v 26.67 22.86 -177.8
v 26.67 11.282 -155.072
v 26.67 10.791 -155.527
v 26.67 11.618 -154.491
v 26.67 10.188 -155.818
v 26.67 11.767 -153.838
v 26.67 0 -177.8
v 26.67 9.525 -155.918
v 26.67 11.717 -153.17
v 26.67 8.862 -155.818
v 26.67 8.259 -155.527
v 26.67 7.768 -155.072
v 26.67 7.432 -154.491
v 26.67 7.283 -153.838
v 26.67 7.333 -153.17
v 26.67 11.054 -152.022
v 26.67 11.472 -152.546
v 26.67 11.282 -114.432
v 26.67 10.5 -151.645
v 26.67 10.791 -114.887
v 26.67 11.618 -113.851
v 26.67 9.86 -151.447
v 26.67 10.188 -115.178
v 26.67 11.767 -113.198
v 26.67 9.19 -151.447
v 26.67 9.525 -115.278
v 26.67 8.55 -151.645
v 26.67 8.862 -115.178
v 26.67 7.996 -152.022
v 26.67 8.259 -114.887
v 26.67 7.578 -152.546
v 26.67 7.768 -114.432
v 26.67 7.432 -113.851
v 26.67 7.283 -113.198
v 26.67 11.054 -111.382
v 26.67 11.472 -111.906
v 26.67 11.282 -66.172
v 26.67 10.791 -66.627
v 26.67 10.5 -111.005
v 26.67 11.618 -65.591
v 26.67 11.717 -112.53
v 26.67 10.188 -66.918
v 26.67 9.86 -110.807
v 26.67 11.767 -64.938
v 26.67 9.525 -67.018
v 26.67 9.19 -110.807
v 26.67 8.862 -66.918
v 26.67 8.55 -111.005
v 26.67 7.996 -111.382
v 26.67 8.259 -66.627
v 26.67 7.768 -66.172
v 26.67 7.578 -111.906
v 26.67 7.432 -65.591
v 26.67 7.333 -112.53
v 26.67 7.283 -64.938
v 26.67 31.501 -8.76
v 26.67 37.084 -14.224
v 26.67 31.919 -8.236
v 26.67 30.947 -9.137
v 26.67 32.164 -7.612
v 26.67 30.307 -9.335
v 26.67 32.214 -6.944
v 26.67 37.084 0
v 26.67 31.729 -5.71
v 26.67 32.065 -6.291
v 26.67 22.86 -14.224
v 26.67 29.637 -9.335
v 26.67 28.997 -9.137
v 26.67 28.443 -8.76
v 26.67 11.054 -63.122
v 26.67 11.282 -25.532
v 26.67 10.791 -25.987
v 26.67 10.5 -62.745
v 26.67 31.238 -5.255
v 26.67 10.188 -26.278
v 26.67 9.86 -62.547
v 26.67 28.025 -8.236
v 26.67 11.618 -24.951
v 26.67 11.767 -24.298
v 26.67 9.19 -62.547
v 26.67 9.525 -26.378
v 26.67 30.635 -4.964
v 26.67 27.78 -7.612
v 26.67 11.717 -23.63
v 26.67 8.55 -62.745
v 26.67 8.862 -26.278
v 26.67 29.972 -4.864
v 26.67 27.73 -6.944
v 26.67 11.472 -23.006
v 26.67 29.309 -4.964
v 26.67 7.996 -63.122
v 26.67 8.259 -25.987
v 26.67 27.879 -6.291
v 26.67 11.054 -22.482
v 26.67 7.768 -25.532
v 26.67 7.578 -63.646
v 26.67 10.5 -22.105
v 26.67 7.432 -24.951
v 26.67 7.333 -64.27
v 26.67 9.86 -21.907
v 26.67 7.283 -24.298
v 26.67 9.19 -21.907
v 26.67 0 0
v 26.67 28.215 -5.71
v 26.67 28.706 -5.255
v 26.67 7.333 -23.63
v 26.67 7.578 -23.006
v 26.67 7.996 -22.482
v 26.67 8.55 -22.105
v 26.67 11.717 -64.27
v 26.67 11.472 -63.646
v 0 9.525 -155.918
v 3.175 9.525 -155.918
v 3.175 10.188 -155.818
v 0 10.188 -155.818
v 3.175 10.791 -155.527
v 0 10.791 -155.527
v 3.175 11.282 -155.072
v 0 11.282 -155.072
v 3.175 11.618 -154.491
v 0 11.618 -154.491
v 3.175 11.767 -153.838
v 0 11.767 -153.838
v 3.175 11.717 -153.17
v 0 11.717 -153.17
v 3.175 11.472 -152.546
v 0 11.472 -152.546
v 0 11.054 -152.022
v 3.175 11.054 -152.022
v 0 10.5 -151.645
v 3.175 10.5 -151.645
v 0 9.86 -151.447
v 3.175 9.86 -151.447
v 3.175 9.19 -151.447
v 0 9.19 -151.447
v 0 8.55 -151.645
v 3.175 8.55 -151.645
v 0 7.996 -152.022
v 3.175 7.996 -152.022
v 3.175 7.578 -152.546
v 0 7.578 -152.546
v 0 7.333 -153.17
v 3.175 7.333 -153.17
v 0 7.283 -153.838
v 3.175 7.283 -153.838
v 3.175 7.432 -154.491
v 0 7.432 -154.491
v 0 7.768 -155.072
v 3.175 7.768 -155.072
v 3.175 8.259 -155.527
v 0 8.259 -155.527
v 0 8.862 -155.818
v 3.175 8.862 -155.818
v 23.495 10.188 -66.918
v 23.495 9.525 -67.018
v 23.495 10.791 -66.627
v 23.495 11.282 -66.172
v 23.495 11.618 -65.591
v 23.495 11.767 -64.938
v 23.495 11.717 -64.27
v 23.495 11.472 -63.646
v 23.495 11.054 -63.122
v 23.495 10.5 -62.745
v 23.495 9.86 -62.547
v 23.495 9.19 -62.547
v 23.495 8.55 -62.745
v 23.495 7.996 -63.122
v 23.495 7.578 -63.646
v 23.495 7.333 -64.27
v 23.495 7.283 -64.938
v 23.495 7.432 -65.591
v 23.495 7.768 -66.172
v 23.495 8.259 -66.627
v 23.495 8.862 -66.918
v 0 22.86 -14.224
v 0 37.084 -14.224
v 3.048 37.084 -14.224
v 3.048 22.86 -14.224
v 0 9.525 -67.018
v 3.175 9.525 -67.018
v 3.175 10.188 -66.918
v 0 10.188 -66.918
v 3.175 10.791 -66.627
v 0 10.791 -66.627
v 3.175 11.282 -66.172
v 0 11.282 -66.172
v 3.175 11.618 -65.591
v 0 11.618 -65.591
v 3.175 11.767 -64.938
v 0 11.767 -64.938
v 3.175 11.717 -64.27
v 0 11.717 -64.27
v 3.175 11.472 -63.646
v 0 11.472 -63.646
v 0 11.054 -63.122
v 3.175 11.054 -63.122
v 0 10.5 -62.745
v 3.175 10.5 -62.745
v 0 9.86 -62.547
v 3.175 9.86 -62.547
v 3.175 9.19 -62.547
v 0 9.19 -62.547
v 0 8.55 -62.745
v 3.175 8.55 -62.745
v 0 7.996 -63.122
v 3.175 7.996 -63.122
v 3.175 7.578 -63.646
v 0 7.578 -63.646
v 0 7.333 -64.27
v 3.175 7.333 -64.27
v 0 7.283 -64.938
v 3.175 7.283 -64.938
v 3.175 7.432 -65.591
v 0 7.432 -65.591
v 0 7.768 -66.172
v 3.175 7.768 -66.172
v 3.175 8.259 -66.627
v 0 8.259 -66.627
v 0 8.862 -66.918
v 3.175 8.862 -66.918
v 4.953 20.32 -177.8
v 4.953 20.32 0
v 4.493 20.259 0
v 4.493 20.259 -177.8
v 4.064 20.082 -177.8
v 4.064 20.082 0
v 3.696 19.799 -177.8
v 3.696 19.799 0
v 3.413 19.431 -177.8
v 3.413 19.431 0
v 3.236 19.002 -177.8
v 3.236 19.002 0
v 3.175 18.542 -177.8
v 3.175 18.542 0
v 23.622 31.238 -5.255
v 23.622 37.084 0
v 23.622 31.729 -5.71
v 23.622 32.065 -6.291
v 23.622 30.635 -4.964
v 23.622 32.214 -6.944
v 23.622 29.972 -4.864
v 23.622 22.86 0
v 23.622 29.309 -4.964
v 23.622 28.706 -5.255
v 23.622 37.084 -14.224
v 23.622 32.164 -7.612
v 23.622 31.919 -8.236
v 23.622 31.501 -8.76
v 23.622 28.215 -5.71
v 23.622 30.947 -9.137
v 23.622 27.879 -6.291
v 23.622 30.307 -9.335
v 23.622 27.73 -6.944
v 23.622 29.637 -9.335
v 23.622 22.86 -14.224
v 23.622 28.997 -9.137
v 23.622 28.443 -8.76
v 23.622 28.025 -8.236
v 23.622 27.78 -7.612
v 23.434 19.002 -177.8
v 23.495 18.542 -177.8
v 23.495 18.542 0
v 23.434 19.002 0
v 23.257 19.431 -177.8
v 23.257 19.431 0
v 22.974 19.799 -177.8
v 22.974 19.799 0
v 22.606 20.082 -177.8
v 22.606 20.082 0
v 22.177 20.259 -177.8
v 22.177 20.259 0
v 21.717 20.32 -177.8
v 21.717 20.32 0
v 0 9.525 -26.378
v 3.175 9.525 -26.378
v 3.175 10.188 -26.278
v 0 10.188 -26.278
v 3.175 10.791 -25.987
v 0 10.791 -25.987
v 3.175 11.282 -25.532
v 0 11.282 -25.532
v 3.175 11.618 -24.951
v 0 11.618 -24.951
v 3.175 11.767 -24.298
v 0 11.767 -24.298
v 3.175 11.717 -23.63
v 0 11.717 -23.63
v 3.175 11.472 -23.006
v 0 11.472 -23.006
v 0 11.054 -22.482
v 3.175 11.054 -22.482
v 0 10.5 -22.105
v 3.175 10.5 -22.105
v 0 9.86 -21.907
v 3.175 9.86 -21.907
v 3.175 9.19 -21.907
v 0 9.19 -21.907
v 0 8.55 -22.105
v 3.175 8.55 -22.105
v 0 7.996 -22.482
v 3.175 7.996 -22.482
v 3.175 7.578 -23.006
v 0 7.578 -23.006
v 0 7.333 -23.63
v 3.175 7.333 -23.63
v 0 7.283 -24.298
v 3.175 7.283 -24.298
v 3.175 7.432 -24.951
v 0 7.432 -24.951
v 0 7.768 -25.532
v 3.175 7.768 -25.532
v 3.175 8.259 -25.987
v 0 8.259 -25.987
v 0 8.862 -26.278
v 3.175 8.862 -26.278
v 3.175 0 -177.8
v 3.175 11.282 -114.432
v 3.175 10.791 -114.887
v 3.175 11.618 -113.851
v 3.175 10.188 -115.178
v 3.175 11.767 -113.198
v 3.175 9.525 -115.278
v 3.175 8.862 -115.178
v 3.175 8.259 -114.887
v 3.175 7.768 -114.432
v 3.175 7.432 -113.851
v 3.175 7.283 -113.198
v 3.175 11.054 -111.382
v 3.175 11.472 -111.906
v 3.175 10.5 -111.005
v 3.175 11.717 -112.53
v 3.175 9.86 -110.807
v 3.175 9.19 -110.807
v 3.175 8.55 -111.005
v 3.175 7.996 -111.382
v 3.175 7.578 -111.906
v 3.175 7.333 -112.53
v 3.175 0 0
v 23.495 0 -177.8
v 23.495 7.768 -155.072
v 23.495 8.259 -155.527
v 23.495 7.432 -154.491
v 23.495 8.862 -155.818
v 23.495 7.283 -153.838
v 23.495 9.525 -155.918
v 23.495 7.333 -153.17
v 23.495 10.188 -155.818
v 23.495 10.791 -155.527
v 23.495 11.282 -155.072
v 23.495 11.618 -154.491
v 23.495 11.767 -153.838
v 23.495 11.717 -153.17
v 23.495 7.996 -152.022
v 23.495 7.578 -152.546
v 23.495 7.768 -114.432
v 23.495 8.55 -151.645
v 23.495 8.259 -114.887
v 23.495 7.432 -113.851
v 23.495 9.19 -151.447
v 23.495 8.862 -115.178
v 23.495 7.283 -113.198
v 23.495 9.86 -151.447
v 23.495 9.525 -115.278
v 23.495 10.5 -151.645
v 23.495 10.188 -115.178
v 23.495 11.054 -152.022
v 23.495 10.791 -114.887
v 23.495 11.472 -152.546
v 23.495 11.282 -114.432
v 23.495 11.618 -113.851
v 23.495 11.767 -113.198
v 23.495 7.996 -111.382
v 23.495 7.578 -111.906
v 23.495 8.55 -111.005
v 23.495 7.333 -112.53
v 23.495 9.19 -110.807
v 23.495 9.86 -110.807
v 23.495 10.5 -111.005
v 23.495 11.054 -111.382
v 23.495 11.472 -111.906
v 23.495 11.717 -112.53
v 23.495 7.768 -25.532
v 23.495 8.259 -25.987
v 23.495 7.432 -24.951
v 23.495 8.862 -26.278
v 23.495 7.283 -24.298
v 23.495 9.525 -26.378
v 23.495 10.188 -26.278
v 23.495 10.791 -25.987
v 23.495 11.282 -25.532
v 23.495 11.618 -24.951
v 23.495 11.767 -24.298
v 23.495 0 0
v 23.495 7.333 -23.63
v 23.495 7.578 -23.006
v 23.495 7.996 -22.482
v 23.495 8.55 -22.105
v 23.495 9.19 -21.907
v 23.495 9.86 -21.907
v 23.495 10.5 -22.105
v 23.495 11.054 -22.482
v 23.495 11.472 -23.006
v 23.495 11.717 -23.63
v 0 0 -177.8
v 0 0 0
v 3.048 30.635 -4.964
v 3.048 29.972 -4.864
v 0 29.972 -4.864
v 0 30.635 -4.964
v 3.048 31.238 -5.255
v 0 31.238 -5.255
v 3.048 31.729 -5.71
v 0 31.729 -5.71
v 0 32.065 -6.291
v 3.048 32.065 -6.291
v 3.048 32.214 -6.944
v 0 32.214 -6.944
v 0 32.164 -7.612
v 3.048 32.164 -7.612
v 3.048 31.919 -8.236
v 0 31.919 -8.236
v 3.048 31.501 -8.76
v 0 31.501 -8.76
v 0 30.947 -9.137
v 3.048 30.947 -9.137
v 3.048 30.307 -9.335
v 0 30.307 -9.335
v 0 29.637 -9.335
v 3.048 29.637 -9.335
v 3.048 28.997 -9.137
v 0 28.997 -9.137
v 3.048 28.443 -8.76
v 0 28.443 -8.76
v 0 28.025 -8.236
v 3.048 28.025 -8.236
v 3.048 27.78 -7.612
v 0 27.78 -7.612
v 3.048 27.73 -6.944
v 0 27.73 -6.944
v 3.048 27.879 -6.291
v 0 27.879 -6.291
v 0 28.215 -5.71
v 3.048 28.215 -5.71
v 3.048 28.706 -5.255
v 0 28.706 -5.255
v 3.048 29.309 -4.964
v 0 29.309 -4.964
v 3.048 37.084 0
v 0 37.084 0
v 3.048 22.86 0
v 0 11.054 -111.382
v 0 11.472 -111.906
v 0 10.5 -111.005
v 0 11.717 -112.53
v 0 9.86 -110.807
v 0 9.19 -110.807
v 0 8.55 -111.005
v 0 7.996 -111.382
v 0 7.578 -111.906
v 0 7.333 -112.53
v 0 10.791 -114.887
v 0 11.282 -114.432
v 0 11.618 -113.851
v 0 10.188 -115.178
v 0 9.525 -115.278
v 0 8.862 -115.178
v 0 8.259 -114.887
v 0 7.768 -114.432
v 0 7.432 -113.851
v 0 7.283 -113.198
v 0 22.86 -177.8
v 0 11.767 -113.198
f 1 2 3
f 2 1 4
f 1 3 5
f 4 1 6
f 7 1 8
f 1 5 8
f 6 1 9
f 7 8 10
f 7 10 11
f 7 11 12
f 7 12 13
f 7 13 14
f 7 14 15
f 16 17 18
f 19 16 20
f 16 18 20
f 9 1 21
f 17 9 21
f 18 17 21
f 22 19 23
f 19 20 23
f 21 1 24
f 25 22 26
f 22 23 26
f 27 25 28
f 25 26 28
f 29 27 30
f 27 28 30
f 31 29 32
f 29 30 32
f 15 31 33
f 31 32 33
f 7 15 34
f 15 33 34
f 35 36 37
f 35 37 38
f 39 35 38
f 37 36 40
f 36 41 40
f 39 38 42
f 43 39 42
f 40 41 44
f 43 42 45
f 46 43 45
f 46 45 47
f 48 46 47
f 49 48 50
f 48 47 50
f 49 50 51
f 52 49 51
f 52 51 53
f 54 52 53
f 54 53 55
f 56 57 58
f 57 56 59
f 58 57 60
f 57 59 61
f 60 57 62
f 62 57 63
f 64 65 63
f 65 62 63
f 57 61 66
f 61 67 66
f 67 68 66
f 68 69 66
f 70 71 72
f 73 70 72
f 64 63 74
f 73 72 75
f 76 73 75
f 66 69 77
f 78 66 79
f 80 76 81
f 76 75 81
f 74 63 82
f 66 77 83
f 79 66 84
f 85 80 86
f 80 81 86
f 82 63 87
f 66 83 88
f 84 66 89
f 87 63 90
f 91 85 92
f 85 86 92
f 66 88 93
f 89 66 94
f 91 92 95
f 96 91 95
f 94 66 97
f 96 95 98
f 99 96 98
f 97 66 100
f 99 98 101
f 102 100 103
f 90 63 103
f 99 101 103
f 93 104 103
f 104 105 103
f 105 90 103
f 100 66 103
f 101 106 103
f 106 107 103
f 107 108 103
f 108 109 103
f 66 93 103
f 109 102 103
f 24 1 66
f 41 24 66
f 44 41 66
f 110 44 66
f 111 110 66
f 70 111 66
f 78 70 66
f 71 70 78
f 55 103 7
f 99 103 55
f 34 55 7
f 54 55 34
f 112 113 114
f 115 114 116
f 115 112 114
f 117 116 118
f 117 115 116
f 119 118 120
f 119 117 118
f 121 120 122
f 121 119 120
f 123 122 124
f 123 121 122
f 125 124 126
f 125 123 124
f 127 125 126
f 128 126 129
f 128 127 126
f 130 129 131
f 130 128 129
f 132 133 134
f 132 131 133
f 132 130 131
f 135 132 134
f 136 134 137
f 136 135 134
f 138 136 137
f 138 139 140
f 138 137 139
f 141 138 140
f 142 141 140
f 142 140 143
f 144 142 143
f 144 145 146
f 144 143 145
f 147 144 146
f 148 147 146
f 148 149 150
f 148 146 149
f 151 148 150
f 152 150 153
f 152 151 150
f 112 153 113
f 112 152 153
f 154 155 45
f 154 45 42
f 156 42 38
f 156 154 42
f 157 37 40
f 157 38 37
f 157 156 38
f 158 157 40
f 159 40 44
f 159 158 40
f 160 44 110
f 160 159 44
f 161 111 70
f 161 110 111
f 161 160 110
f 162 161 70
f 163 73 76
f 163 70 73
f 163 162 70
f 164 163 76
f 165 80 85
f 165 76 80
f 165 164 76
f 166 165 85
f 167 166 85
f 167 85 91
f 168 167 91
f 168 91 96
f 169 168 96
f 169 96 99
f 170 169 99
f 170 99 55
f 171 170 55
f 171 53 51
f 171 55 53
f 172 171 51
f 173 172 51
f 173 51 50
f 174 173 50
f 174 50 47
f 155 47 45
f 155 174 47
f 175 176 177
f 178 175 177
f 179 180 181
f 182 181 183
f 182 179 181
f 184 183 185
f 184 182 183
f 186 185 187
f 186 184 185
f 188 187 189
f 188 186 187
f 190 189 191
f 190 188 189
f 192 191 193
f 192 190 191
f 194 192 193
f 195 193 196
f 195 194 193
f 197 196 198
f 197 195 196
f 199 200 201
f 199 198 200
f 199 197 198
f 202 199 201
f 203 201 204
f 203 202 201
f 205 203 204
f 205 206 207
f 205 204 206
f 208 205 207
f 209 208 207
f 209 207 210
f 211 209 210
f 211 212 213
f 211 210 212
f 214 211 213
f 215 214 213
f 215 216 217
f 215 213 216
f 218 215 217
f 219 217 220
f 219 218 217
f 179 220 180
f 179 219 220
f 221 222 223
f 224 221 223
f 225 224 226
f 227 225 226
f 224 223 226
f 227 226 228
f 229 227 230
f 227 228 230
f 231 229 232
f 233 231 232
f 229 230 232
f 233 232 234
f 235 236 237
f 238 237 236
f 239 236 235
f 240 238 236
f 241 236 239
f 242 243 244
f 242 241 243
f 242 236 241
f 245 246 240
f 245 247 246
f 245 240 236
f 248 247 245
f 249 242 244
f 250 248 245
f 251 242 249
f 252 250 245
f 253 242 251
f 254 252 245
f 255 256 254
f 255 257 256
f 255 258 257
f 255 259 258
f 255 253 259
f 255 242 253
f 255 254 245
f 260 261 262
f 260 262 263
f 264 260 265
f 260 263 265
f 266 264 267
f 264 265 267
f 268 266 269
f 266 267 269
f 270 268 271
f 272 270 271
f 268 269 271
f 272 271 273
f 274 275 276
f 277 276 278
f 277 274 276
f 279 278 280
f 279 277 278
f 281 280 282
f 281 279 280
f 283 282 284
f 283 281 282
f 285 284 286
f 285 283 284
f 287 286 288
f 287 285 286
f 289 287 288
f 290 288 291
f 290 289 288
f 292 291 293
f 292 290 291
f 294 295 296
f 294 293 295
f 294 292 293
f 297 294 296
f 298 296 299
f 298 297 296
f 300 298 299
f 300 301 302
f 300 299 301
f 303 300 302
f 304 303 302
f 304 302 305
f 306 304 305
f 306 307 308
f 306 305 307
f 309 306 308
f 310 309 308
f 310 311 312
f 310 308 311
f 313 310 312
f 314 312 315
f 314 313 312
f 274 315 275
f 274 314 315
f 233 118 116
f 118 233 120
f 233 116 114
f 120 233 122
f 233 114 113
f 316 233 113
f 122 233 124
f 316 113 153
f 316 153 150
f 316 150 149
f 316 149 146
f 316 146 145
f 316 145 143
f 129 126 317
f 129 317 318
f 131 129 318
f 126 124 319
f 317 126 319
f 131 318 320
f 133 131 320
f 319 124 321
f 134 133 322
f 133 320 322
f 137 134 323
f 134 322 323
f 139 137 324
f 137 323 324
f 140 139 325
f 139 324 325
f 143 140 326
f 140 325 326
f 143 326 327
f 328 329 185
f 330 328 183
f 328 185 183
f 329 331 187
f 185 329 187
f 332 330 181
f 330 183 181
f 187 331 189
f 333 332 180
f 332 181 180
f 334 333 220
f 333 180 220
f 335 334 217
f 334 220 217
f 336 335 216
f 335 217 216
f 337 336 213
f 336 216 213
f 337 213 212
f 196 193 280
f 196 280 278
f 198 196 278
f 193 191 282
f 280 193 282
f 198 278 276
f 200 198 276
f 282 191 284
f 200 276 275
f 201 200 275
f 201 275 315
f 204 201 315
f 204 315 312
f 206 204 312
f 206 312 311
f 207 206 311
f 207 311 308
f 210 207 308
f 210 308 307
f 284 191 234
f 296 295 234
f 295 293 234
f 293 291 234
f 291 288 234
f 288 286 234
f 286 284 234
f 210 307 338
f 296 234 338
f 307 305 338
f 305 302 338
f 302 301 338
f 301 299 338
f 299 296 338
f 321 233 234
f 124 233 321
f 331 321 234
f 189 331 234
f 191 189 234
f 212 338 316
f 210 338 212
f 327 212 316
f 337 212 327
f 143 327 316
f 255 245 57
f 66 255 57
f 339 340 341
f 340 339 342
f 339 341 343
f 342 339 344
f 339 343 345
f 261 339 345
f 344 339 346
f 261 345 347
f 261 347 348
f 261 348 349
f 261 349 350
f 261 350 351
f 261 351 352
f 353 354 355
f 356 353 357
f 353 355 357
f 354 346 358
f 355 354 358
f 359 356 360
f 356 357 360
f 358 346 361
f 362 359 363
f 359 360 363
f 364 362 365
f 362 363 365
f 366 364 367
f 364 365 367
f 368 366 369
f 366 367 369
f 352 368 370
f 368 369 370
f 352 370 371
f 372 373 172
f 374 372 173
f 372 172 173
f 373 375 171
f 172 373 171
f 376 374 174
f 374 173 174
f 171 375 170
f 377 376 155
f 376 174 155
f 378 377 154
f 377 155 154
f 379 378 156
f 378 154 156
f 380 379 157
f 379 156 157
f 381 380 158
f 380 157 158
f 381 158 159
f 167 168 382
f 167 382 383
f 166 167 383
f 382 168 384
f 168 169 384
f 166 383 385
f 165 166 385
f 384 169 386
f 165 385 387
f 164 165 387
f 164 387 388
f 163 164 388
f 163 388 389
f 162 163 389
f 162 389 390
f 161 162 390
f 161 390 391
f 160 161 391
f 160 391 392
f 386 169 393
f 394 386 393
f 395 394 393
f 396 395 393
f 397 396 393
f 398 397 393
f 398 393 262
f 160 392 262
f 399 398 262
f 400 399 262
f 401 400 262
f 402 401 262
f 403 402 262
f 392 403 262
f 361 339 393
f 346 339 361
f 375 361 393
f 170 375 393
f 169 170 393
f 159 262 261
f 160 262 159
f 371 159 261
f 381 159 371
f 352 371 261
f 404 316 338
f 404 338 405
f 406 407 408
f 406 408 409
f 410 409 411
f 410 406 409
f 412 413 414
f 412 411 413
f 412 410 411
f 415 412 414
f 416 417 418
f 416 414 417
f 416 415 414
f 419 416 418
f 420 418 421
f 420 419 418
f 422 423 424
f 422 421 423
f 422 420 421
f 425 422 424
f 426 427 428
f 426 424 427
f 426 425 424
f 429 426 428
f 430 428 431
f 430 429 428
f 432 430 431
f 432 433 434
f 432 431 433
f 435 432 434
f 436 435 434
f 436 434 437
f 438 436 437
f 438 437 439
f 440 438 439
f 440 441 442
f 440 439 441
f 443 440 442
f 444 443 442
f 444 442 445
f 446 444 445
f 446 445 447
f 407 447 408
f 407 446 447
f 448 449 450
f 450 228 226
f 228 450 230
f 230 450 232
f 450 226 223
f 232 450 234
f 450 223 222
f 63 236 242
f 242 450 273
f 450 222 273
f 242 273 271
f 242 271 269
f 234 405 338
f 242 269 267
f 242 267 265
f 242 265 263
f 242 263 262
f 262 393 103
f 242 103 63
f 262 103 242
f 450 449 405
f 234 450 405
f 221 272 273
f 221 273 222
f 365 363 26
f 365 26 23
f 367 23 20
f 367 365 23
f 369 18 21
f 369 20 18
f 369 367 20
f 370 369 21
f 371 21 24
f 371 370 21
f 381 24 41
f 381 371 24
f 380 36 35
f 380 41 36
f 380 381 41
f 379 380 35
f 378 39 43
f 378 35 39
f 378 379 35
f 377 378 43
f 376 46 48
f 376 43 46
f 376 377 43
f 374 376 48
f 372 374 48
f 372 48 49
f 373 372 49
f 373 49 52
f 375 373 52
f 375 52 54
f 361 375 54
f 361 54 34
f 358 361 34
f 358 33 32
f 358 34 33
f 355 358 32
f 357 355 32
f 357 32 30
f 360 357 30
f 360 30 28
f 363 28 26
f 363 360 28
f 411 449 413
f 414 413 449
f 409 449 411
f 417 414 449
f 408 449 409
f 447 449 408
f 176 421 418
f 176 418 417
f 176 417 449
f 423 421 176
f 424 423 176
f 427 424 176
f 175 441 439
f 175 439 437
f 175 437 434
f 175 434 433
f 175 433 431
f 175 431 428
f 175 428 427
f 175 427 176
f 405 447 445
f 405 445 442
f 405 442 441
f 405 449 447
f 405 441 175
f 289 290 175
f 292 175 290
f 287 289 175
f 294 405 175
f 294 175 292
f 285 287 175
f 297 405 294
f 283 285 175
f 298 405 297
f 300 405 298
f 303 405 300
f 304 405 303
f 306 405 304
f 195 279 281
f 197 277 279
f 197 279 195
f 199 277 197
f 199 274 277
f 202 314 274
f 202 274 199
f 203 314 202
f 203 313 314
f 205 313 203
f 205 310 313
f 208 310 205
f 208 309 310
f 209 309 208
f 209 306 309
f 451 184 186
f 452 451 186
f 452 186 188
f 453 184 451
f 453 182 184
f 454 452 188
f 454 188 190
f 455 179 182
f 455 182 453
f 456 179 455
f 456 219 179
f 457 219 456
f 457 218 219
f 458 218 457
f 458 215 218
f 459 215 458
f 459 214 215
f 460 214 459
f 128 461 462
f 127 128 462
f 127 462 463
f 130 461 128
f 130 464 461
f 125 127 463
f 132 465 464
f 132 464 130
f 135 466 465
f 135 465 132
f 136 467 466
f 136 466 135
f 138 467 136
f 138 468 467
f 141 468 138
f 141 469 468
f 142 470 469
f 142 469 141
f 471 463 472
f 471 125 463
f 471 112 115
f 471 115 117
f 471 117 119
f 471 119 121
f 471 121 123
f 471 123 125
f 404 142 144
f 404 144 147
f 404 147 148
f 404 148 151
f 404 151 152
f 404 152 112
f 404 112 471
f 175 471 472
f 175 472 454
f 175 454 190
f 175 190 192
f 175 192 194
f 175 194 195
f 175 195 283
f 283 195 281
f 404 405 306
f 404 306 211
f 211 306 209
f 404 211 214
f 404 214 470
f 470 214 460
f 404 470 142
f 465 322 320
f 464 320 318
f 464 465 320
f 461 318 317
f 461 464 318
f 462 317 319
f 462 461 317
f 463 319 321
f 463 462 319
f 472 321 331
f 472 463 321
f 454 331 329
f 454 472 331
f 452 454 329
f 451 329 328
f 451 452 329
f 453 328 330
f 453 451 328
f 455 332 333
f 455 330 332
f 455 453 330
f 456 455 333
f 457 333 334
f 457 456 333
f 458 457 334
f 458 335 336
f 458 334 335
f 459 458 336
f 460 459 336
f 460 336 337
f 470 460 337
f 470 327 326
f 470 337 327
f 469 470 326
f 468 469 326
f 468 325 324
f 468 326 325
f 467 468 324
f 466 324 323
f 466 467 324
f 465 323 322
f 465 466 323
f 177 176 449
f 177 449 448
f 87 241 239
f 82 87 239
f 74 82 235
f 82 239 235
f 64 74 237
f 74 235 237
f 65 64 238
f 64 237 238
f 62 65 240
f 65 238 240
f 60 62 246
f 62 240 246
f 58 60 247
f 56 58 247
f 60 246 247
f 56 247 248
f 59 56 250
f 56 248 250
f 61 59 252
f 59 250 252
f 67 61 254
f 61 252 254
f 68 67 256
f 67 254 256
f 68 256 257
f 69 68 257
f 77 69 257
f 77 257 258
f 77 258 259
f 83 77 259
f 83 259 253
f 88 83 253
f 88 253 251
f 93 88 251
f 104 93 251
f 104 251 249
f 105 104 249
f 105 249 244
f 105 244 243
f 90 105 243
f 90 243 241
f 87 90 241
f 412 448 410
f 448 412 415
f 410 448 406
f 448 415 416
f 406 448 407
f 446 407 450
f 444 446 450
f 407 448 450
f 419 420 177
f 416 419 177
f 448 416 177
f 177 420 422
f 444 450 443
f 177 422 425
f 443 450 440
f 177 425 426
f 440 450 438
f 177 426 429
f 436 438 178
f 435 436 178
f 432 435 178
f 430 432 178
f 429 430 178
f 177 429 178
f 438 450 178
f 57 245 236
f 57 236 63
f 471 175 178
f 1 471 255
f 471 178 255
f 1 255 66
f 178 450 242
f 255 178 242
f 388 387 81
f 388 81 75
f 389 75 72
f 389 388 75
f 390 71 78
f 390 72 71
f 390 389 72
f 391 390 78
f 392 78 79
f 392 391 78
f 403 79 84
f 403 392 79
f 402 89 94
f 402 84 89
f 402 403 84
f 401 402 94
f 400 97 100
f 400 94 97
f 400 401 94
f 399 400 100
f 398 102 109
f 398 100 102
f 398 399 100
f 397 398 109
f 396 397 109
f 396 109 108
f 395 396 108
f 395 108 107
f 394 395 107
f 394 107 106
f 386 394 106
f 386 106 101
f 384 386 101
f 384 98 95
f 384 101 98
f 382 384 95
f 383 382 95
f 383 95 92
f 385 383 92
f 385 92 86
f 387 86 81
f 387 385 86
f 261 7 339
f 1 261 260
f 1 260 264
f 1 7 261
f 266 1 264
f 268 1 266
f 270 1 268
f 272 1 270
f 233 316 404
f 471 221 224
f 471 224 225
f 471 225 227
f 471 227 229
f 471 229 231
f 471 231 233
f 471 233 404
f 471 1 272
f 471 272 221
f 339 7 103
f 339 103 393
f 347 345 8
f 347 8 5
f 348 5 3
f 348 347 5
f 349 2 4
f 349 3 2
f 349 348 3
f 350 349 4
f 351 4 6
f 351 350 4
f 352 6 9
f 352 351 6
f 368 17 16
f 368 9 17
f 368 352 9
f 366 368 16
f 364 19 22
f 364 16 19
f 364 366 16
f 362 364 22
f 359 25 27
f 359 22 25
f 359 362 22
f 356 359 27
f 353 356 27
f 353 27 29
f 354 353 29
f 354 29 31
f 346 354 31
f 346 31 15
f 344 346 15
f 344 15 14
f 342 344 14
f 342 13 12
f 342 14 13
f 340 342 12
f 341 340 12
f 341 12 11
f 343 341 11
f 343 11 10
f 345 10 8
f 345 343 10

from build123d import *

# Parameters (mm, degrees)
BOSS_EXTRUDE2_DEPTH     = 177.8
SKETCH19_R              = 2.2479
CUT_EXTRUDE3_DEPTH      = 27.67
SKETCH21_W              = 3.048
SKETCH21_H              = 14.224
BOSS_EXTRUDE4_DEPTH     = 14.224
SKETCH22_R              = 2.2479
CUT_EXTRUDE4_DEPTH      = 24.622
CUT_EXTRUDE4_DEPTH_BACK = 4.048


with BuildPart() as part:
    # Sketch2 → Boss-Extrude2 (new body)
    with BuildSketch(Plane.XY):
        with BuildLine():
            Line((0, 0), (0, 22.86))
            Line((0, 22.86), (26.67, 22.86))
            Line((26.67, 22.86), (26.67, 0))
            Line((26.67, 0), (23.495, 0))
            Line((23.495, 0), (23.495, 18.542))
            ThreePointArc((23.495, 18.542), (22.974235857, 19.799235857), (21.717, 20.32))
            Line((21.717, 20.32), (4.953, 20.32))
            ThreePointArc((4.953, 20.32), (3.695764143, 19.799235857), (3.175, 18.542))
            Line((3.175, 18.542), (3.175, 0))
            Line((3.175, 0), (0, 0))
        make_face()
    extrude(amount=-BOSS_EXTRUDE2_DEPTH)

    # Sketch19 → Cut-Extrude3 (cut, through all)
    with BuildSketch(Plane(origin=(0, 0, 0), x_dir=(0, 0, -1), z_dir=(1, 0, 0))):
        with Locations((24.13, 9.525)):
            Circle(SKETCH19_R)
        with Locations((64.77, 9.525)):
            Circle(SKETCH19_R)
        with Locations((113.03, 9.525)):
            Circle(SKETCH19_R)
        with Locations((153.67, 9.525)):
            Circle(SKETCH19_R)
    extrude(amount=CUT_EXTRUDE3_DEPTH, mode=Mode.SUBTRACT)

    # Sketch21 → Boss-Extrude4 (add)
    with BuildSketch(Plane(origin=(0, 22.86, 0), x_dir=(1, 0, 0), z_dir=(0, 1, 0))):
        with Locations((1.524, 7.112)):
            Rectangle(SKETCH21_W, SKETCH21_H)
        with Locations((25.146, 7.112)):
            Rectangle(SKETCH21_W, SKETCH21_H)
    extrude(amount=BOSS_EXTRUDE4_DEPTH)

    # Sketch22 → Cut-Extrude4 (cut, two sides)
    with BuildSketch(Plane.ZY.offset(-23.622)) as cut_extrude4_sk:
        with Locations((-7.112, 29.972)):
            Circle(SKETCH22_R)
    extrude(amount=CUT_EXTRUDE4_DEPTH, mode=Mode.SUBTRACT)
    extrude(cut_extrude4_sk.sketch, amount=-CUT_EXTRUDE4_DEPTH_BACK, mode=Mode.SUBTRACT)


solid = part.part
